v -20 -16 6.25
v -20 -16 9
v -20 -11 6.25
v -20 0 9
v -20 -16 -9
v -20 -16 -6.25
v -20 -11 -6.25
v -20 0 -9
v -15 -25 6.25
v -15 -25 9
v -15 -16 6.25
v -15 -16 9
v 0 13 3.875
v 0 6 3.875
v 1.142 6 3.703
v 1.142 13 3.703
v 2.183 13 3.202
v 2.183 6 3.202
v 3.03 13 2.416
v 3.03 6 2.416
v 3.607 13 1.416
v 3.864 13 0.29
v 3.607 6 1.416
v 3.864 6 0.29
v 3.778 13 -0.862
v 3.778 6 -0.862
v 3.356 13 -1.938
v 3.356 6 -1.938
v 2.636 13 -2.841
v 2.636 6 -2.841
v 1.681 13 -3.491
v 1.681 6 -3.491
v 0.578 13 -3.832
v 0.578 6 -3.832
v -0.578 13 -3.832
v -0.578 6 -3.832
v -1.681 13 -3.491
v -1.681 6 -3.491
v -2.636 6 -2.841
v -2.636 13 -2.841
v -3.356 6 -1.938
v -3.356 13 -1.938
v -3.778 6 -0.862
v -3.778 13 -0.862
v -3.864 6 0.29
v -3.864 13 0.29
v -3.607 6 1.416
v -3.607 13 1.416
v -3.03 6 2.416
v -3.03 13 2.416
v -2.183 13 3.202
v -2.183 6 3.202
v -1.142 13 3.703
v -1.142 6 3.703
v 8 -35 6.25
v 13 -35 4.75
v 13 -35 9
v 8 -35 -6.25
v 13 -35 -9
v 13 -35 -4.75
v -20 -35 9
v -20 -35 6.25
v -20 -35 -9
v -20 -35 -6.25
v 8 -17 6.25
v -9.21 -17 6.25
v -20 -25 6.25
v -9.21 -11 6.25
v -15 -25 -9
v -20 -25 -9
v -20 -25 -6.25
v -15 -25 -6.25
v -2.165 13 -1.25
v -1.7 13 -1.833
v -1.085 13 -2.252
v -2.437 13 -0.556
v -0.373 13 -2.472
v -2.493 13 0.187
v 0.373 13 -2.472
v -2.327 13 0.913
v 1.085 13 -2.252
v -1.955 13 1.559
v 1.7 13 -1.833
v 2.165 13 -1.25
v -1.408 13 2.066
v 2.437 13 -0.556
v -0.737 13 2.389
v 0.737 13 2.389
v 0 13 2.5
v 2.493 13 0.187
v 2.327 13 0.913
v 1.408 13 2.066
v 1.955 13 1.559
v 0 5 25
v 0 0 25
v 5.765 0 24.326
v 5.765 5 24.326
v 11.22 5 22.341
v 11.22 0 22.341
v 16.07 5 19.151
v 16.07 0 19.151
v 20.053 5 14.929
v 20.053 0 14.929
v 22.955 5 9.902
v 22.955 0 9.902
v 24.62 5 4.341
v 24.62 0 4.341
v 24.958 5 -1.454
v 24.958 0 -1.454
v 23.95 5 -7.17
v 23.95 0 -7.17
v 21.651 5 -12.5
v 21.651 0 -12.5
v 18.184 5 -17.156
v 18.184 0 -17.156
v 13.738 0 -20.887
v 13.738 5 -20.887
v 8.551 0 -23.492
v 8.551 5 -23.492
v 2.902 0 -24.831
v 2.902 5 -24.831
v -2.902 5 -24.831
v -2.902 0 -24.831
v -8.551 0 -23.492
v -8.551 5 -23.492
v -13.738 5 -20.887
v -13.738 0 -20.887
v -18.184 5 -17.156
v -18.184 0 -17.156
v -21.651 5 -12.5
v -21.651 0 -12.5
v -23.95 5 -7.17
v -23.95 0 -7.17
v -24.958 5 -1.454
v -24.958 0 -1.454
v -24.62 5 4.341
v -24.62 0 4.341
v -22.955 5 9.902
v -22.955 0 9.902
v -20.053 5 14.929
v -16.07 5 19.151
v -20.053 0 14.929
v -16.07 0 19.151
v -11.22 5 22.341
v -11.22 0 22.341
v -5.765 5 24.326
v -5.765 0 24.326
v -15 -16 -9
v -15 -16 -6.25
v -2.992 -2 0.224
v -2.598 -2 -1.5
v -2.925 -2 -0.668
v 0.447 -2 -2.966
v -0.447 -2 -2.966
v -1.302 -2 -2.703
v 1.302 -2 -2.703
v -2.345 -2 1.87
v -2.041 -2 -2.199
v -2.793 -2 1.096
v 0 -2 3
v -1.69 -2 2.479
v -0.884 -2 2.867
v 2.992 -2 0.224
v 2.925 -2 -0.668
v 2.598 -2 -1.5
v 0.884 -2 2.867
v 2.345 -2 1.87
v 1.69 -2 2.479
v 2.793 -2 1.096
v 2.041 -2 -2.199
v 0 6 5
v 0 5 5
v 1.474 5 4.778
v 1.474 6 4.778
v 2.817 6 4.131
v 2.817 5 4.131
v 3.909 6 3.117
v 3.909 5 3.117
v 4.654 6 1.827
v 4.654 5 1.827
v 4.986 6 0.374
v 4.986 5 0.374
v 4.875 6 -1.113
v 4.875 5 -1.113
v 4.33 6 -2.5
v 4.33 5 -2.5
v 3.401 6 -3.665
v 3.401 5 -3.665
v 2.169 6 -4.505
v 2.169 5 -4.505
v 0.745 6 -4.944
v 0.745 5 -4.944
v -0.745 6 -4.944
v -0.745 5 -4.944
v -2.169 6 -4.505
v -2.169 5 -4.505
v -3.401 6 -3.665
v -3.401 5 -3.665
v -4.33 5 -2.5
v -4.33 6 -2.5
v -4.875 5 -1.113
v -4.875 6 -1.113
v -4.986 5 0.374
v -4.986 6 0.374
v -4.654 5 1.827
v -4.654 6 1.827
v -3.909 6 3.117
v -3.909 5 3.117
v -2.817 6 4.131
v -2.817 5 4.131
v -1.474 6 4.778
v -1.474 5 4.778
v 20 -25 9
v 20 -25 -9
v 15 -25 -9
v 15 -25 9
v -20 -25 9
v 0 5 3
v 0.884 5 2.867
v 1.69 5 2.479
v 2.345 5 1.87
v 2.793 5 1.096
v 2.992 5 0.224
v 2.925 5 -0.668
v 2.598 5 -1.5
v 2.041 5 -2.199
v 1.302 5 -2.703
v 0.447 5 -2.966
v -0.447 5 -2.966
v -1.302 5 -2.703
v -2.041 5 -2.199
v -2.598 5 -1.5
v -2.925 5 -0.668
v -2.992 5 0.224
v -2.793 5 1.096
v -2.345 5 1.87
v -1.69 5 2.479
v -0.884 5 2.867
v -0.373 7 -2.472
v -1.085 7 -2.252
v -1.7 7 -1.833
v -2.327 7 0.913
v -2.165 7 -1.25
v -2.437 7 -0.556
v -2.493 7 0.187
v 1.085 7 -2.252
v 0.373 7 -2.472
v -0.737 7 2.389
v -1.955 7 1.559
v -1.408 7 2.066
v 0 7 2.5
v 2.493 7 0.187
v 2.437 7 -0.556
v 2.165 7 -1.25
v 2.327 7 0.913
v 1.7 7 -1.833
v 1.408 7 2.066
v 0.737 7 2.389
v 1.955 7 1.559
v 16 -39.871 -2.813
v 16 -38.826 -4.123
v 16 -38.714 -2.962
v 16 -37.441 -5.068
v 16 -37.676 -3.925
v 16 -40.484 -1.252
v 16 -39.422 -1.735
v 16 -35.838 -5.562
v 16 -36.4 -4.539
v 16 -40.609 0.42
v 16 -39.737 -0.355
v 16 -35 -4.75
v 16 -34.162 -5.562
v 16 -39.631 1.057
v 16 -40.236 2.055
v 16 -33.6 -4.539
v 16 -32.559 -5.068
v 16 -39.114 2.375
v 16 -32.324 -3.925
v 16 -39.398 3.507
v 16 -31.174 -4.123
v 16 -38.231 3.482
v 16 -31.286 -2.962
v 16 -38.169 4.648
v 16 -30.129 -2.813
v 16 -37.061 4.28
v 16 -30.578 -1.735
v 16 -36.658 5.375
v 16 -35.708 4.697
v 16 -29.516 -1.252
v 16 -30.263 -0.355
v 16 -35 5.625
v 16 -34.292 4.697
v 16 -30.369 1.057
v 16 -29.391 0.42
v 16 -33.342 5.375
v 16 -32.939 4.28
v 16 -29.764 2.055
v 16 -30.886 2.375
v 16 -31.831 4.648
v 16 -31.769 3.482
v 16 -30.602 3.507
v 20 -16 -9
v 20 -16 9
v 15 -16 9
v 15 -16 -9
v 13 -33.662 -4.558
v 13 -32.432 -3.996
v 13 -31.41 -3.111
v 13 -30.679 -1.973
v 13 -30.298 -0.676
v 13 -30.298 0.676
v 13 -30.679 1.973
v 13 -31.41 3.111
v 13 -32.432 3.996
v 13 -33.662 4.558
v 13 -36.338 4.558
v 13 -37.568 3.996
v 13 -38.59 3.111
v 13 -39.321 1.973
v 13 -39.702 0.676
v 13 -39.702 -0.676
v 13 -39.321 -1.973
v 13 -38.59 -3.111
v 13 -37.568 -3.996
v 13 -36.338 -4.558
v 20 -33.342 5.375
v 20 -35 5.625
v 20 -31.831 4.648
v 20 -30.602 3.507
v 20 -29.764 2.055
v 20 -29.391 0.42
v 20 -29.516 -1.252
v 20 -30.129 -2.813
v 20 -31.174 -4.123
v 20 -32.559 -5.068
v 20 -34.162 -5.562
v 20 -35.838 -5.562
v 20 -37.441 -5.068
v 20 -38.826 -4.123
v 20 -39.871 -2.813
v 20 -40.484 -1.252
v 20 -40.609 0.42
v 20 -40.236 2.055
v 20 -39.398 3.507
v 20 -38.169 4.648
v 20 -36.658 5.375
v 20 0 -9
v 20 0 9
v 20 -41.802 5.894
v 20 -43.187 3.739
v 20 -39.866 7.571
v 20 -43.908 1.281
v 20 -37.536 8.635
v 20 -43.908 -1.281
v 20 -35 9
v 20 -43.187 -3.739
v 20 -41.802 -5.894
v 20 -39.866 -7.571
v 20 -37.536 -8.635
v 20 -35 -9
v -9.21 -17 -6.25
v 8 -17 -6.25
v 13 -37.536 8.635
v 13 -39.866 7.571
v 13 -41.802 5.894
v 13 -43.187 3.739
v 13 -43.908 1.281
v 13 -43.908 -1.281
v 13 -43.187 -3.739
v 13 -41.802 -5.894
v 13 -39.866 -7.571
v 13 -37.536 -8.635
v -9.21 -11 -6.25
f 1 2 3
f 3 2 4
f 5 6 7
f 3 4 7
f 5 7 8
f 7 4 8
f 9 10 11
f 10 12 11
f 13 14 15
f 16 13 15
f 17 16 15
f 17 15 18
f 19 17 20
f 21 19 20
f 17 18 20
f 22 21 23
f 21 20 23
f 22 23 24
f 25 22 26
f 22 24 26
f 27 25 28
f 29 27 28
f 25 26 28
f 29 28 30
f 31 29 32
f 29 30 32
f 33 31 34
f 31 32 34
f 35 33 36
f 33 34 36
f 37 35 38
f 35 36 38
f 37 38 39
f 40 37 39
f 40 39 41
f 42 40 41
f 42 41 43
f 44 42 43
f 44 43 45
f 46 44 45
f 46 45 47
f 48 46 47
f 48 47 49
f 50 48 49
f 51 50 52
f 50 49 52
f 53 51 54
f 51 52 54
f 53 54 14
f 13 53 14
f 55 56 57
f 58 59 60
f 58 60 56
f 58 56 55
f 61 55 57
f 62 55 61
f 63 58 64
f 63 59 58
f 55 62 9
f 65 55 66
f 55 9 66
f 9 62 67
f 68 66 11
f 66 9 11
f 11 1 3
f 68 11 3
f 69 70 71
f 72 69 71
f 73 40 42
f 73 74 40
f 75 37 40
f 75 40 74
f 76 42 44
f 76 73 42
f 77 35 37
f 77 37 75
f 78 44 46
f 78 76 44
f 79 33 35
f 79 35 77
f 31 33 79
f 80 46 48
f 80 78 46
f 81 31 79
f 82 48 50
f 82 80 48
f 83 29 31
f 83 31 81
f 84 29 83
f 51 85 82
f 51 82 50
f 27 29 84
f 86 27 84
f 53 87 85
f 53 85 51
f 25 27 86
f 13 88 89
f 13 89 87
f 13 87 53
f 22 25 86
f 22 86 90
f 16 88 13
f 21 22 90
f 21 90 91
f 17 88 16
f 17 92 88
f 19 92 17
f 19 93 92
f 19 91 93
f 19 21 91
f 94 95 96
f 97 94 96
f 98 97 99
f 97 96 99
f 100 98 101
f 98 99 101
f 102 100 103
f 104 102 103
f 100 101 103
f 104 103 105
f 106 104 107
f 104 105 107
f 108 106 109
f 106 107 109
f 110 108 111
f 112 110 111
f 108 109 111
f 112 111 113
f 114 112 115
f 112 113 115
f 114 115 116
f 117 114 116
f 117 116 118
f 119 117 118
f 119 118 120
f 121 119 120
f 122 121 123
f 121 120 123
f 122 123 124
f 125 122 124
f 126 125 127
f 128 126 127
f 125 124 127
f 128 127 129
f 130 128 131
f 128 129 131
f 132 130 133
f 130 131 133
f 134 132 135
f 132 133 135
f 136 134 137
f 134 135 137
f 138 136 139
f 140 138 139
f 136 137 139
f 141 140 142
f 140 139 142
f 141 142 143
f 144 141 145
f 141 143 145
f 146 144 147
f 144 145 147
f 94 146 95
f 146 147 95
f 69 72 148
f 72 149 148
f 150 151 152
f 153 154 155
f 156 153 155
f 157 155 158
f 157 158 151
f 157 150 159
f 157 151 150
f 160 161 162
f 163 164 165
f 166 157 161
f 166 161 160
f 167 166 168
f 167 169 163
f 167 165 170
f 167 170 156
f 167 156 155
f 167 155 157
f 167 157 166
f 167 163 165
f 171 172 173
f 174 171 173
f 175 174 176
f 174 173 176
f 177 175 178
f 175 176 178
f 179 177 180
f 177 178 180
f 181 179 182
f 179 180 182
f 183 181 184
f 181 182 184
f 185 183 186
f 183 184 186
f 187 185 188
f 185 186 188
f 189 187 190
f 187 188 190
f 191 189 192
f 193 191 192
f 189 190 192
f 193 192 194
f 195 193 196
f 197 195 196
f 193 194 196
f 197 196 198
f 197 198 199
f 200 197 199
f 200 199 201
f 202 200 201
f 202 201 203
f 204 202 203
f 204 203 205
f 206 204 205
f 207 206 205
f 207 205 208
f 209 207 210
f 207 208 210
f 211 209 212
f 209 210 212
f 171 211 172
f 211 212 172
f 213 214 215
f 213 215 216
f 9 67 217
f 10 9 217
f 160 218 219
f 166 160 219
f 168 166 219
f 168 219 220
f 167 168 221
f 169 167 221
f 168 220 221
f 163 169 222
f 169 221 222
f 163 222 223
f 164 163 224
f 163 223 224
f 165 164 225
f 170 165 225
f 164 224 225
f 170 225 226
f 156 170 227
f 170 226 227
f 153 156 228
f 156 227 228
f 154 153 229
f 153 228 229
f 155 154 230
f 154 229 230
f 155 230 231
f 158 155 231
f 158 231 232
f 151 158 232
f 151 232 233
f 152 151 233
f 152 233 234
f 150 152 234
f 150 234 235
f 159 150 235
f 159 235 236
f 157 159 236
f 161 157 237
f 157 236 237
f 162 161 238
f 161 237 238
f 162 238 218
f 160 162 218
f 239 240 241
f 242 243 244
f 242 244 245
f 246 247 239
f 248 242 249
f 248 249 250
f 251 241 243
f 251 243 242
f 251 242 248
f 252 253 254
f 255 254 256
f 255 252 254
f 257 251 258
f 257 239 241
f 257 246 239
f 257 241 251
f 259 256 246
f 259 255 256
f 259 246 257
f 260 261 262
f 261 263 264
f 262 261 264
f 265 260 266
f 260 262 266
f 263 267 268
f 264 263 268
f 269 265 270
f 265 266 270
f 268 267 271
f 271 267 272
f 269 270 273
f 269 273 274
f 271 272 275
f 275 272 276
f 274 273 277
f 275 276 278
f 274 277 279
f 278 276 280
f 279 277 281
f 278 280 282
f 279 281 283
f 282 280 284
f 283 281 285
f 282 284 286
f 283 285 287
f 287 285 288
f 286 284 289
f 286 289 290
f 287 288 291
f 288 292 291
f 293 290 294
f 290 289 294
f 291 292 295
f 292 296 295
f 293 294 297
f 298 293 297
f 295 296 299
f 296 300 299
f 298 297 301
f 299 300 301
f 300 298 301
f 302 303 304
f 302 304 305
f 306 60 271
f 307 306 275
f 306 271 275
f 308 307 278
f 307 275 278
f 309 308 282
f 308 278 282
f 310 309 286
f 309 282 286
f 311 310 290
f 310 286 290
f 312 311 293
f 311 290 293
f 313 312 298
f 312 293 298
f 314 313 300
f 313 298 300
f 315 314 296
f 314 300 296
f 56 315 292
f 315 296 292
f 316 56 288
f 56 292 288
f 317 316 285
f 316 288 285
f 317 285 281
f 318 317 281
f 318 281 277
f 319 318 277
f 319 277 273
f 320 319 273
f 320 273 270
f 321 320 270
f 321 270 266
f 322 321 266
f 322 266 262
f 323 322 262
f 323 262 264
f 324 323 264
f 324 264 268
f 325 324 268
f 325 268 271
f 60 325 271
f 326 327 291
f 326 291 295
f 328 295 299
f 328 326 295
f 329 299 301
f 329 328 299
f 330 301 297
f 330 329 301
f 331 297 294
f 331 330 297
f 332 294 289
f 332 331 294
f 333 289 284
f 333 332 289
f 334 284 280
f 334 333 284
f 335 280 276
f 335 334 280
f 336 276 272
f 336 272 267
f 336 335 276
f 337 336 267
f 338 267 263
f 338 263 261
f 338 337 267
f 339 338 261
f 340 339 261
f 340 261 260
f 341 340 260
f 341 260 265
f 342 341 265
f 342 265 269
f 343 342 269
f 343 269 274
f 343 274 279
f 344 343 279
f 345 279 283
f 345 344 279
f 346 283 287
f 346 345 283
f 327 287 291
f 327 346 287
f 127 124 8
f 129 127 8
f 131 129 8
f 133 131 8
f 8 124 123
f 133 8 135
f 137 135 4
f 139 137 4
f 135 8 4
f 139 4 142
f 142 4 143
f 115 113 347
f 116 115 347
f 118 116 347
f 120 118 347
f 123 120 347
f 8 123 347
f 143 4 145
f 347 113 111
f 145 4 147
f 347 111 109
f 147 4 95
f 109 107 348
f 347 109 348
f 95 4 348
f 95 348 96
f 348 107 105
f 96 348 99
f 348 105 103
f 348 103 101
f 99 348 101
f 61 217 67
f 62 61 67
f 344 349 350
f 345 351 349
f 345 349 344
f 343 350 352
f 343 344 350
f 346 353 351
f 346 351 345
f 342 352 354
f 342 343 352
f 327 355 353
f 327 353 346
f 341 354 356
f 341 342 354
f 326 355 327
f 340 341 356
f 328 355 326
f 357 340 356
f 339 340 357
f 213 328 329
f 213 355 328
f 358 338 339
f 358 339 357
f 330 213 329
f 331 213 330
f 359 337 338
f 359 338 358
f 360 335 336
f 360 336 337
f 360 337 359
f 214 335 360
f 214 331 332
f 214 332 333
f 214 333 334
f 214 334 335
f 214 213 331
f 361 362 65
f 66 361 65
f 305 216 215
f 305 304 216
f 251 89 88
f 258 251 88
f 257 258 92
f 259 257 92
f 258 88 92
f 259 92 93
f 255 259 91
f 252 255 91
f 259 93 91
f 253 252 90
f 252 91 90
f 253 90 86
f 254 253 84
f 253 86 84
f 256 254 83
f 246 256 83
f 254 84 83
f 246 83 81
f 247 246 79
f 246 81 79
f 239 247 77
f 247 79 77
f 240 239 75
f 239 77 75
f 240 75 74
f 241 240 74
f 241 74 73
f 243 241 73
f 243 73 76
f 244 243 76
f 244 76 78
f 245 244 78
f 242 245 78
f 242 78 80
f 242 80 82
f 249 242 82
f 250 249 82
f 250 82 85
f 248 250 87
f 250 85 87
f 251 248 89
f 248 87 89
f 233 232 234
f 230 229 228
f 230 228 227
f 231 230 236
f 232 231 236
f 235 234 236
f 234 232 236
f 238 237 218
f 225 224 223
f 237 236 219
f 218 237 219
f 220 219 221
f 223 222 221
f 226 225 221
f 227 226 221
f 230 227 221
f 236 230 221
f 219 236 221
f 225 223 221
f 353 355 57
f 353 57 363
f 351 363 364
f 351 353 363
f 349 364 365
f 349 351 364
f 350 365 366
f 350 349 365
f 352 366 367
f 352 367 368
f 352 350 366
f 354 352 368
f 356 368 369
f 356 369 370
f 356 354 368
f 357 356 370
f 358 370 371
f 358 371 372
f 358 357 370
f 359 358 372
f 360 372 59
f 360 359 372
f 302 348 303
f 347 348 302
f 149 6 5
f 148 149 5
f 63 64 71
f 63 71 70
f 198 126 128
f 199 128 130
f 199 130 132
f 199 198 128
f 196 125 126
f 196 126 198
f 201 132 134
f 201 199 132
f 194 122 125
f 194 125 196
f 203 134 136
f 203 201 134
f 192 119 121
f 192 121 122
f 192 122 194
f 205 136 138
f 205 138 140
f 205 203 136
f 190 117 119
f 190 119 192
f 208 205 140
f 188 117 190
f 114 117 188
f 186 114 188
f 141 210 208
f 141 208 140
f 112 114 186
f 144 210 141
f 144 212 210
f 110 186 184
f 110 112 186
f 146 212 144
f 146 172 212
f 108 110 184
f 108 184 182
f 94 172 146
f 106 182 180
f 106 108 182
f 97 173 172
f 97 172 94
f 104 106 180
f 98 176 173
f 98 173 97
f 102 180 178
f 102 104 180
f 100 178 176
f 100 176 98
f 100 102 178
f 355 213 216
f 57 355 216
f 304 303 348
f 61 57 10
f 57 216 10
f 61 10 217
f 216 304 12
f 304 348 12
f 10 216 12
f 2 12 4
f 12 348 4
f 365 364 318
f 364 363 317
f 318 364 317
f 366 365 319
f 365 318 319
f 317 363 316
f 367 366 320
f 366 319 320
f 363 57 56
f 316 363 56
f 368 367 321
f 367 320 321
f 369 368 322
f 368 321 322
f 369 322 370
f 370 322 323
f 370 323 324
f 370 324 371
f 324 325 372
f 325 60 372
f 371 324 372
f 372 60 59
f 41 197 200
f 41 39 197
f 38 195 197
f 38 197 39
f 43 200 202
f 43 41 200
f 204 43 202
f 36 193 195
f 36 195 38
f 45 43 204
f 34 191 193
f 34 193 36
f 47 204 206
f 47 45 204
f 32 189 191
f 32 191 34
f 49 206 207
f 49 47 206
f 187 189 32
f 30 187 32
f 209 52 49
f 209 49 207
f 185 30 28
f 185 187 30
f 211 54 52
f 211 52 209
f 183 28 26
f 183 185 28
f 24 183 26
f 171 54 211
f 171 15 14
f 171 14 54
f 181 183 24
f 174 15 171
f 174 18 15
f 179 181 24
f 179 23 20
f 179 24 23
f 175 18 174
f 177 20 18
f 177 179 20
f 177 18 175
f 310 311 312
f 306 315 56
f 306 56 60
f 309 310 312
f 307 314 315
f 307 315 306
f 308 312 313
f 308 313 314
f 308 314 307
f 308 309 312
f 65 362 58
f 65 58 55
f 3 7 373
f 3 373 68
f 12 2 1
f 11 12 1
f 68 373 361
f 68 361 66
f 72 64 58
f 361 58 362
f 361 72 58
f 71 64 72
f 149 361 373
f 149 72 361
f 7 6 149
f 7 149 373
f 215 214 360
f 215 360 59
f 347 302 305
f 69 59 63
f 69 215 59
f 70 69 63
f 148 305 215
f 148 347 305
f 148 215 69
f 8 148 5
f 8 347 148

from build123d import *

# Parameters (mm, degrees)
SKETCH1_R           = 25
BOSS_EXTRUDE1_DEPTH = 5
SKETCH8_R           = 4.75
BOSS_EXTRUDE3_DEPTH = 7
SKETCH9_R           = 5.625
CUT_EXTRUDE3_DEPTH  = 4
SKETCH11_W          = 33
SKETCH11_H          = 18
BOSS_EXTRUDE4_DEPTH = 35
SKETCH12_W          = 12.5
SKETCH12_H          = 18
CUT_EXTRUDE4_DEPTH  = 28
SKETCH13_W          = 12.5
SKETCH13_H          = 6
CUT_EXTRUDE6_DEPTH  = 10.79
CUT_EXTRUDE8_DEPTH  = 5
SKETCH16_R          = 5
BOSS_EXTRUDE5_DEPTH = 1
SKETCH17_R          = 3.875
BOSS_EXTRUDE6_DEPTH = 7
SKETCH18_R          = 2.5
CUT_EXTRUDE9_DEPTH  = 6
SKETCH14_R          = 3
CUT_EXTRUDE7_DEPTH  = 7


with BuildPart() as part:
    # Sketch1 → Boss-Extrude1 (new body)
    with BuildSketch(Plane(origin=(0, 0, 0), x_dir=(1, 0, 0), z_dir=(0, 1, 0))):
        with Locations(Location((0, 0, 0), (0, 0, 270))):
            Circle(SKETCH1_R)
    extrude(amount=BOSS_EXTRUDE1_DEPTH)

    # Sketch8 → Boss-Extrude3 (add)
    with BuildSketch(Plane(origin=(20, 0, 0), x_dir=(0, 0, -1), z_dir=(1, 0, 0))):
        with BuildLine():
            Line((-9, 0), (-9, -35))
            ThreePointArc((-9, -35), (0, -44), (9, -35))
            Line((9, -35), (9, 0))
            Line((9, 0), (-9, 0))
        make_face()
        with Locations((0, -35)):
            Circle(SKETCH8_R, mode=Mode.SUBTRACT)
    extrude(amount=-BOSS_EXTRUDE3_DEPTH)

    # Sketch9 → Cut-Extrude3 (cut)
    with BuildSketch(Plane.ZY.offset(-20)):
        with Locations((0, -35)):
            Circle(SKETCH9_R)
    extrude(amount=CUT_EXTRUDE3_DEPTH, mode=Mode.SUBTRACT)

    # Sketch11 → Boss-Extrude4 (add)
    with BuildSketch(Plane(origin=(0, 0, 0), x_dir=(-1, 0, 0), z_dir=(0, -1, 0))):
        with Locations((3.5, 0)):
            Rectangle(SKETCH11_W, SKETCH11_H)
    extrude(amount=BOSS_EXTRUDE4_DEPTH)

    # Sketch12 → Cut-Extrude4 (cut)
    with BuildSketch(Plane.ZY.offset(20)):
        with Locations((0, -26)):
            Rectangle(SKETCH12_W, SKETCH12_H)
    extrude(amount=-CUT_EXTRUDE4_DEPTH, mode=Mode.SUBTRACT)

    # Sketch13 → Cut-Extrude6 (cut)
    with BuildSketch(Plane.ZY.offset(20)):
        with Locations((0, -14)):
            Rectangle(SKETCH13_W, SKETCH13_H)
    extrude(amount=-CUT_EXTRUDE6_DEPTH, mode=Mode.SUBTRACT)

    # Sketch15 → Cut-Extrude8 (cut)
    with BuildSketch(Plane.ZY.offset(20)):
        Polygon((-6.25, -25), (-9, -25), (-9, -16), (-6.25, -16), (9, -16), (9, -25), align=None)
    cut_extrude8 = extrude(amount=-CUT_EXTRUDE8_DEPTH, mode=Mode.SUBTRACT)

    # Mirror1: Cut-Extrude8 across plane
    add(cut_extrude8.mirror(Plane.ZY), mode=Mode.SUBTRACT)

    # Sketch16 → Boss-Extrude5 (add)
    with BuildSketch(Plane(origin=(0, 5, 0), x_dir=(1, 0, 0), z_dir=(0, 1, 0))):
        with Locations(Location((0, 0, 0), (0, 0, 270))):
            Circle(SKETCH16_R)
    extrude(amount=BOSS_EXTRUDE5_DEPTH)

    # Sketch17 → Boss-Extrude6 (add)
    with BuildSketch(Plane(origin=(0, 6, 0), x_dir=(1, 0, 0), z_dir=(0, 1, 0))):
        with Locations(Location((0, 0, 0), (0, 0, 270))):
            Circle(SKETCH17_R)
    extrude(amount=BOSS_EXTRUDE6_DEPTH)

    # Sketch18 → Cut-Extrude9 (cut)
    with BuildSketch(Plane(origin=(0, 13, 0), x_dir=(1, 0, 0), z_dir=(0, 1, 0))):
        with Locations(Location((0, 0, 0), (0, 0, 270))):
            Circle(SKETCH18_R)
    extrude(amount=-CUT_EXTRUDE9_DEPTH, mode=Mode.SUBTRACT)

    # Sketch14 → Cut-Extrude7 (cut)
    with BuildSketch(Plane(origin=(0, 5, 0), x_dir=(1, 0, 0), z_dir=(0, 1, 0))):
        with Locations(Location((0, 0, 0), (0, 0, 270))):
            Circle(SKETCH14_R)
    extrude(amount=-CUT_EXTRUDE7_DEPTH, mode=Mode.SUBTRACT)


solid = part.part
